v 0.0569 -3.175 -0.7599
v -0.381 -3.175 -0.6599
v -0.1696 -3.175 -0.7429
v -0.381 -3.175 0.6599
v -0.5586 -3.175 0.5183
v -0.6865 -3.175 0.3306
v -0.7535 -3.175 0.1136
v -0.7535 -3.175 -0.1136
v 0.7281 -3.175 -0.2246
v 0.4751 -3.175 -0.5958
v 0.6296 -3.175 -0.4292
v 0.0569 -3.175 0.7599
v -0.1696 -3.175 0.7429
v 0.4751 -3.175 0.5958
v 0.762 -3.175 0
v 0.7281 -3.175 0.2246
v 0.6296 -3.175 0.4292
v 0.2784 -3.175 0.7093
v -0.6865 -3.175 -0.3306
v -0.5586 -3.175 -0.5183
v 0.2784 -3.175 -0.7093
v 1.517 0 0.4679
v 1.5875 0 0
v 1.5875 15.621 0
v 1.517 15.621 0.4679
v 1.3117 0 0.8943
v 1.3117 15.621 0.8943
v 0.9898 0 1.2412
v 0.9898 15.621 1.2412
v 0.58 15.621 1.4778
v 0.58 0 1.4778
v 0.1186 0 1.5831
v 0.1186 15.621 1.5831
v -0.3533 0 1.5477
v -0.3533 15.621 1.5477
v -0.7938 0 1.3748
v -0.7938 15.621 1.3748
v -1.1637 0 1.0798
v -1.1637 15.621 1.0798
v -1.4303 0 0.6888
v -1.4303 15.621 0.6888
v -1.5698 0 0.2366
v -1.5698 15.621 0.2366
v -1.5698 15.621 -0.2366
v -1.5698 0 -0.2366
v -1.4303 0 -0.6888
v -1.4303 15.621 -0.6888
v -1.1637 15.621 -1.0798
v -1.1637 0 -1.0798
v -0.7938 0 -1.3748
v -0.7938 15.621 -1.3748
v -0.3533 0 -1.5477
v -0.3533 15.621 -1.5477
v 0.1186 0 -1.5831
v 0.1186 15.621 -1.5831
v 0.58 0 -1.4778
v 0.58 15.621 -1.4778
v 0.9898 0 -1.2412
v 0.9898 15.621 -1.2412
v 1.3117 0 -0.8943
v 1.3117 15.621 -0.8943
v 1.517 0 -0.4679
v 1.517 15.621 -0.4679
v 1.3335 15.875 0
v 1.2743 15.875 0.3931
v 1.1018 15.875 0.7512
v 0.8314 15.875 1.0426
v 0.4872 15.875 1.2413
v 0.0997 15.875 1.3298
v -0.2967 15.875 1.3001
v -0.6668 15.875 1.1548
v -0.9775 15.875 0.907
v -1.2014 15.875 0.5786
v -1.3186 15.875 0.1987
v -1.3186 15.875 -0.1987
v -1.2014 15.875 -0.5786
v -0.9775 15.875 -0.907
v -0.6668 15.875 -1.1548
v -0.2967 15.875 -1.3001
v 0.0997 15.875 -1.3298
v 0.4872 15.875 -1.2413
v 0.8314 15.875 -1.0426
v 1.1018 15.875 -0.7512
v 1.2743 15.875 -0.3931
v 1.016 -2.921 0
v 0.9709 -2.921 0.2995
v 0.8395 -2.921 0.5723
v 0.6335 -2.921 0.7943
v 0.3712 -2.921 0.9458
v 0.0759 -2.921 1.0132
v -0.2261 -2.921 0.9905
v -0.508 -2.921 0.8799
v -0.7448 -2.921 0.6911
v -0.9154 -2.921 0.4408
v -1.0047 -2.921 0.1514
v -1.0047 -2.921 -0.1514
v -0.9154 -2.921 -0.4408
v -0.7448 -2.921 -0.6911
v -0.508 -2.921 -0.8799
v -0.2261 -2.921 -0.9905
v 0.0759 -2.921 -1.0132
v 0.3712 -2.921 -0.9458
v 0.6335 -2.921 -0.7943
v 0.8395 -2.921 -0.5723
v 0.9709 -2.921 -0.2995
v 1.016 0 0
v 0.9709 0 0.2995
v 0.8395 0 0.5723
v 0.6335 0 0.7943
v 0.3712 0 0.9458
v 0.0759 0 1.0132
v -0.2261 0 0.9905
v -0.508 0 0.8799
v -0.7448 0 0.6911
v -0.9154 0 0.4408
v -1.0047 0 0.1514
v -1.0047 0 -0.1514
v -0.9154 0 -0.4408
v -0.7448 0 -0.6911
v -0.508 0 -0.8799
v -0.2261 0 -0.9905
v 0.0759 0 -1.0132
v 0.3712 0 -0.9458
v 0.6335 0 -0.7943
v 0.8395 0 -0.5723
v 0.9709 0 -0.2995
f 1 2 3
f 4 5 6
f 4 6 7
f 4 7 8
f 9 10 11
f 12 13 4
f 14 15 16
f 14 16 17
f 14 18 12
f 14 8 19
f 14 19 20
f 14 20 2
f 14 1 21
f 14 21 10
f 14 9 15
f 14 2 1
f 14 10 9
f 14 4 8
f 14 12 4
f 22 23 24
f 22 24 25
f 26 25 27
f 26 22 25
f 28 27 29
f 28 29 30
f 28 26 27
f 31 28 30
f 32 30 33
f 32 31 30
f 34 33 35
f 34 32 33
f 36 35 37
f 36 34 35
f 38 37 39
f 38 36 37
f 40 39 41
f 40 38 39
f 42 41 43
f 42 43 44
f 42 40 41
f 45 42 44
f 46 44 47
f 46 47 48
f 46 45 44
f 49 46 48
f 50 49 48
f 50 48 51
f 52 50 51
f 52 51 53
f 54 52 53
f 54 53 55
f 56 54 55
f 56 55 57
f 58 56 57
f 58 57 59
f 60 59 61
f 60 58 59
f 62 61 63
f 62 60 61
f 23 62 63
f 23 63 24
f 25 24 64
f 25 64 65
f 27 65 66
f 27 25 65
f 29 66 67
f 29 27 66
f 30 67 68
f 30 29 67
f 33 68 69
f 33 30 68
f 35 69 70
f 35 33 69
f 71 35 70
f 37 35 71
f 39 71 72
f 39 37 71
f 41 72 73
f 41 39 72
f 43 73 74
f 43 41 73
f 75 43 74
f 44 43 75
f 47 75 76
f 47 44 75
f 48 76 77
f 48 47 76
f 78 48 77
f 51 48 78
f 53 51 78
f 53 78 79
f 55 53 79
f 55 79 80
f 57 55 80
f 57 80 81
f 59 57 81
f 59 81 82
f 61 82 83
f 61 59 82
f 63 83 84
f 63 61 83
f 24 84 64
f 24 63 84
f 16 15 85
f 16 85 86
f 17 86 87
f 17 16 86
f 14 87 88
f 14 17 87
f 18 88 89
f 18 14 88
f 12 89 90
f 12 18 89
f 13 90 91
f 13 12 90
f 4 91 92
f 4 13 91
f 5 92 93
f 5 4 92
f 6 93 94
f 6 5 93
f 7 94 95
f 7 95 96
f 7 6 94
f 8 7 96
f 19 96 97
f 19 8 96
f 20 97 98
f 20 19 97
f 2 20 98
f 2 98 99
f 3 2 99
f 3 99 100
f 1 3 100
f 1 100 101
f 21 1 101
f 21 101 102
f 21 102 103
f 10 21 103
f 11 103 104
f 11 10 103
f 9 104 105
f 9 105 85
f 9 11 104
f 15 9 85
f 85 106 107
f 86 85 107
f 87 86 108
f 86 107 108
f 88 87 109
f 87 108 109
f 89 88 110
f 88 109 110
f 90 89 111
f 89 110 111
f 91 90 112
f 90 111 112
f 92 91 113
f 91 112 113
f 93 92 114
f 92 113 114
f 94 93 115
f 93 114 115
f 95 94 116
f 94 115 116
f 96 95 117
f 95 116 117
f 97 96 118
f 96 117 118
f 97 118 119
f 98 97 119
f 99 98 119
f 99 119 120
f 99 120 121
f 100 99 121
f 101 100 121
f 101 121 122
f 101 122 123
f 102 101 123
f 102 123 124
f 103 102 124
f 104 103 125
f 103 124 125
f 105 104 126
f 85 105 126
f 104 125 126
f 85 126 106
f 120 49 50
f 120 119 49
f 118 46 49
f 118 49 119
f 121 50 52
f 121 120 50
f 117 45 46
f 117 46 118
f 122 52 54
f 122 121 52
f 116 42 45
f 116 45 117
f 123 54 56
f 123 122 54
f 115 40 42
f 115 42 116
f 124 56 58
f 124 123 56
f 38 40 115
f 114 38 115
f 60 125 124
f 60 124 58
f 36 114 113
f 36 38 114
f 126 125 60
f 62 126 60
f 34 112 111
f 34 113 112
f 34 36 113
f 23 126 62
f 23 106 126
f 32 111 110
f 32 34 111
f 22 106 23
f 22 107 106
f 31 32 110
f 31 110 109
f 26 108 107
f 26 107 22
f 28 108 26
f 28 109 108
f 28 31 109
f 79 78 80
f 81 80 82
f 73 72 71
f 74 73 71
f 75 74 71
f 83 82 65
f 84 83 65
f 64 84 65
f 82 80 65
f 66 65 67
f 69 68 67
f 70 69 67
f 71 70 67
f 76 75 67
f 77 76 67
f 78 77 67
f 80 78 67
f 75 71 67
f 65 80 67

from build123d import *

# Parameters (mm, degrees)
F0_R          = 1.5875
F0_R_2        = 1.016
F1_DEPTH      = 15.875
F2_DEPTH      = 3.175
F2_DEPTH_BACK = 15.875
F3_SIZE       = 0.254


with BuildPart() as f1:
    # F0 (on Front) → F1 (new body)
    with BuildSketch(Plane.XZ):
        Circle(F0_R)
        Circle(F0_R_2, mode=Mode.SUBTRACT)
    extrude(amount=-F1_DEPTH)

    # F0 (on Front) → F2 (join, two sides)
    with BuildSketch(Plane.XZ) as f2_sk:
        Circle(F0_R_2)
    extrude(amount=F2_DEPTH)
    extrude(f2_sk.sketch, amount=-F2_DEPTH_BACK)

    # F3
    f3_edges = [f1.edges().sort_by_distance(p)[0] for p in [
        (-1.5875, 15.875, 0),
        (-1.016, -3.175, 0),
    ]]
    chamfer(f3_edges, length=F3_SIZE)


solid = f1.part
